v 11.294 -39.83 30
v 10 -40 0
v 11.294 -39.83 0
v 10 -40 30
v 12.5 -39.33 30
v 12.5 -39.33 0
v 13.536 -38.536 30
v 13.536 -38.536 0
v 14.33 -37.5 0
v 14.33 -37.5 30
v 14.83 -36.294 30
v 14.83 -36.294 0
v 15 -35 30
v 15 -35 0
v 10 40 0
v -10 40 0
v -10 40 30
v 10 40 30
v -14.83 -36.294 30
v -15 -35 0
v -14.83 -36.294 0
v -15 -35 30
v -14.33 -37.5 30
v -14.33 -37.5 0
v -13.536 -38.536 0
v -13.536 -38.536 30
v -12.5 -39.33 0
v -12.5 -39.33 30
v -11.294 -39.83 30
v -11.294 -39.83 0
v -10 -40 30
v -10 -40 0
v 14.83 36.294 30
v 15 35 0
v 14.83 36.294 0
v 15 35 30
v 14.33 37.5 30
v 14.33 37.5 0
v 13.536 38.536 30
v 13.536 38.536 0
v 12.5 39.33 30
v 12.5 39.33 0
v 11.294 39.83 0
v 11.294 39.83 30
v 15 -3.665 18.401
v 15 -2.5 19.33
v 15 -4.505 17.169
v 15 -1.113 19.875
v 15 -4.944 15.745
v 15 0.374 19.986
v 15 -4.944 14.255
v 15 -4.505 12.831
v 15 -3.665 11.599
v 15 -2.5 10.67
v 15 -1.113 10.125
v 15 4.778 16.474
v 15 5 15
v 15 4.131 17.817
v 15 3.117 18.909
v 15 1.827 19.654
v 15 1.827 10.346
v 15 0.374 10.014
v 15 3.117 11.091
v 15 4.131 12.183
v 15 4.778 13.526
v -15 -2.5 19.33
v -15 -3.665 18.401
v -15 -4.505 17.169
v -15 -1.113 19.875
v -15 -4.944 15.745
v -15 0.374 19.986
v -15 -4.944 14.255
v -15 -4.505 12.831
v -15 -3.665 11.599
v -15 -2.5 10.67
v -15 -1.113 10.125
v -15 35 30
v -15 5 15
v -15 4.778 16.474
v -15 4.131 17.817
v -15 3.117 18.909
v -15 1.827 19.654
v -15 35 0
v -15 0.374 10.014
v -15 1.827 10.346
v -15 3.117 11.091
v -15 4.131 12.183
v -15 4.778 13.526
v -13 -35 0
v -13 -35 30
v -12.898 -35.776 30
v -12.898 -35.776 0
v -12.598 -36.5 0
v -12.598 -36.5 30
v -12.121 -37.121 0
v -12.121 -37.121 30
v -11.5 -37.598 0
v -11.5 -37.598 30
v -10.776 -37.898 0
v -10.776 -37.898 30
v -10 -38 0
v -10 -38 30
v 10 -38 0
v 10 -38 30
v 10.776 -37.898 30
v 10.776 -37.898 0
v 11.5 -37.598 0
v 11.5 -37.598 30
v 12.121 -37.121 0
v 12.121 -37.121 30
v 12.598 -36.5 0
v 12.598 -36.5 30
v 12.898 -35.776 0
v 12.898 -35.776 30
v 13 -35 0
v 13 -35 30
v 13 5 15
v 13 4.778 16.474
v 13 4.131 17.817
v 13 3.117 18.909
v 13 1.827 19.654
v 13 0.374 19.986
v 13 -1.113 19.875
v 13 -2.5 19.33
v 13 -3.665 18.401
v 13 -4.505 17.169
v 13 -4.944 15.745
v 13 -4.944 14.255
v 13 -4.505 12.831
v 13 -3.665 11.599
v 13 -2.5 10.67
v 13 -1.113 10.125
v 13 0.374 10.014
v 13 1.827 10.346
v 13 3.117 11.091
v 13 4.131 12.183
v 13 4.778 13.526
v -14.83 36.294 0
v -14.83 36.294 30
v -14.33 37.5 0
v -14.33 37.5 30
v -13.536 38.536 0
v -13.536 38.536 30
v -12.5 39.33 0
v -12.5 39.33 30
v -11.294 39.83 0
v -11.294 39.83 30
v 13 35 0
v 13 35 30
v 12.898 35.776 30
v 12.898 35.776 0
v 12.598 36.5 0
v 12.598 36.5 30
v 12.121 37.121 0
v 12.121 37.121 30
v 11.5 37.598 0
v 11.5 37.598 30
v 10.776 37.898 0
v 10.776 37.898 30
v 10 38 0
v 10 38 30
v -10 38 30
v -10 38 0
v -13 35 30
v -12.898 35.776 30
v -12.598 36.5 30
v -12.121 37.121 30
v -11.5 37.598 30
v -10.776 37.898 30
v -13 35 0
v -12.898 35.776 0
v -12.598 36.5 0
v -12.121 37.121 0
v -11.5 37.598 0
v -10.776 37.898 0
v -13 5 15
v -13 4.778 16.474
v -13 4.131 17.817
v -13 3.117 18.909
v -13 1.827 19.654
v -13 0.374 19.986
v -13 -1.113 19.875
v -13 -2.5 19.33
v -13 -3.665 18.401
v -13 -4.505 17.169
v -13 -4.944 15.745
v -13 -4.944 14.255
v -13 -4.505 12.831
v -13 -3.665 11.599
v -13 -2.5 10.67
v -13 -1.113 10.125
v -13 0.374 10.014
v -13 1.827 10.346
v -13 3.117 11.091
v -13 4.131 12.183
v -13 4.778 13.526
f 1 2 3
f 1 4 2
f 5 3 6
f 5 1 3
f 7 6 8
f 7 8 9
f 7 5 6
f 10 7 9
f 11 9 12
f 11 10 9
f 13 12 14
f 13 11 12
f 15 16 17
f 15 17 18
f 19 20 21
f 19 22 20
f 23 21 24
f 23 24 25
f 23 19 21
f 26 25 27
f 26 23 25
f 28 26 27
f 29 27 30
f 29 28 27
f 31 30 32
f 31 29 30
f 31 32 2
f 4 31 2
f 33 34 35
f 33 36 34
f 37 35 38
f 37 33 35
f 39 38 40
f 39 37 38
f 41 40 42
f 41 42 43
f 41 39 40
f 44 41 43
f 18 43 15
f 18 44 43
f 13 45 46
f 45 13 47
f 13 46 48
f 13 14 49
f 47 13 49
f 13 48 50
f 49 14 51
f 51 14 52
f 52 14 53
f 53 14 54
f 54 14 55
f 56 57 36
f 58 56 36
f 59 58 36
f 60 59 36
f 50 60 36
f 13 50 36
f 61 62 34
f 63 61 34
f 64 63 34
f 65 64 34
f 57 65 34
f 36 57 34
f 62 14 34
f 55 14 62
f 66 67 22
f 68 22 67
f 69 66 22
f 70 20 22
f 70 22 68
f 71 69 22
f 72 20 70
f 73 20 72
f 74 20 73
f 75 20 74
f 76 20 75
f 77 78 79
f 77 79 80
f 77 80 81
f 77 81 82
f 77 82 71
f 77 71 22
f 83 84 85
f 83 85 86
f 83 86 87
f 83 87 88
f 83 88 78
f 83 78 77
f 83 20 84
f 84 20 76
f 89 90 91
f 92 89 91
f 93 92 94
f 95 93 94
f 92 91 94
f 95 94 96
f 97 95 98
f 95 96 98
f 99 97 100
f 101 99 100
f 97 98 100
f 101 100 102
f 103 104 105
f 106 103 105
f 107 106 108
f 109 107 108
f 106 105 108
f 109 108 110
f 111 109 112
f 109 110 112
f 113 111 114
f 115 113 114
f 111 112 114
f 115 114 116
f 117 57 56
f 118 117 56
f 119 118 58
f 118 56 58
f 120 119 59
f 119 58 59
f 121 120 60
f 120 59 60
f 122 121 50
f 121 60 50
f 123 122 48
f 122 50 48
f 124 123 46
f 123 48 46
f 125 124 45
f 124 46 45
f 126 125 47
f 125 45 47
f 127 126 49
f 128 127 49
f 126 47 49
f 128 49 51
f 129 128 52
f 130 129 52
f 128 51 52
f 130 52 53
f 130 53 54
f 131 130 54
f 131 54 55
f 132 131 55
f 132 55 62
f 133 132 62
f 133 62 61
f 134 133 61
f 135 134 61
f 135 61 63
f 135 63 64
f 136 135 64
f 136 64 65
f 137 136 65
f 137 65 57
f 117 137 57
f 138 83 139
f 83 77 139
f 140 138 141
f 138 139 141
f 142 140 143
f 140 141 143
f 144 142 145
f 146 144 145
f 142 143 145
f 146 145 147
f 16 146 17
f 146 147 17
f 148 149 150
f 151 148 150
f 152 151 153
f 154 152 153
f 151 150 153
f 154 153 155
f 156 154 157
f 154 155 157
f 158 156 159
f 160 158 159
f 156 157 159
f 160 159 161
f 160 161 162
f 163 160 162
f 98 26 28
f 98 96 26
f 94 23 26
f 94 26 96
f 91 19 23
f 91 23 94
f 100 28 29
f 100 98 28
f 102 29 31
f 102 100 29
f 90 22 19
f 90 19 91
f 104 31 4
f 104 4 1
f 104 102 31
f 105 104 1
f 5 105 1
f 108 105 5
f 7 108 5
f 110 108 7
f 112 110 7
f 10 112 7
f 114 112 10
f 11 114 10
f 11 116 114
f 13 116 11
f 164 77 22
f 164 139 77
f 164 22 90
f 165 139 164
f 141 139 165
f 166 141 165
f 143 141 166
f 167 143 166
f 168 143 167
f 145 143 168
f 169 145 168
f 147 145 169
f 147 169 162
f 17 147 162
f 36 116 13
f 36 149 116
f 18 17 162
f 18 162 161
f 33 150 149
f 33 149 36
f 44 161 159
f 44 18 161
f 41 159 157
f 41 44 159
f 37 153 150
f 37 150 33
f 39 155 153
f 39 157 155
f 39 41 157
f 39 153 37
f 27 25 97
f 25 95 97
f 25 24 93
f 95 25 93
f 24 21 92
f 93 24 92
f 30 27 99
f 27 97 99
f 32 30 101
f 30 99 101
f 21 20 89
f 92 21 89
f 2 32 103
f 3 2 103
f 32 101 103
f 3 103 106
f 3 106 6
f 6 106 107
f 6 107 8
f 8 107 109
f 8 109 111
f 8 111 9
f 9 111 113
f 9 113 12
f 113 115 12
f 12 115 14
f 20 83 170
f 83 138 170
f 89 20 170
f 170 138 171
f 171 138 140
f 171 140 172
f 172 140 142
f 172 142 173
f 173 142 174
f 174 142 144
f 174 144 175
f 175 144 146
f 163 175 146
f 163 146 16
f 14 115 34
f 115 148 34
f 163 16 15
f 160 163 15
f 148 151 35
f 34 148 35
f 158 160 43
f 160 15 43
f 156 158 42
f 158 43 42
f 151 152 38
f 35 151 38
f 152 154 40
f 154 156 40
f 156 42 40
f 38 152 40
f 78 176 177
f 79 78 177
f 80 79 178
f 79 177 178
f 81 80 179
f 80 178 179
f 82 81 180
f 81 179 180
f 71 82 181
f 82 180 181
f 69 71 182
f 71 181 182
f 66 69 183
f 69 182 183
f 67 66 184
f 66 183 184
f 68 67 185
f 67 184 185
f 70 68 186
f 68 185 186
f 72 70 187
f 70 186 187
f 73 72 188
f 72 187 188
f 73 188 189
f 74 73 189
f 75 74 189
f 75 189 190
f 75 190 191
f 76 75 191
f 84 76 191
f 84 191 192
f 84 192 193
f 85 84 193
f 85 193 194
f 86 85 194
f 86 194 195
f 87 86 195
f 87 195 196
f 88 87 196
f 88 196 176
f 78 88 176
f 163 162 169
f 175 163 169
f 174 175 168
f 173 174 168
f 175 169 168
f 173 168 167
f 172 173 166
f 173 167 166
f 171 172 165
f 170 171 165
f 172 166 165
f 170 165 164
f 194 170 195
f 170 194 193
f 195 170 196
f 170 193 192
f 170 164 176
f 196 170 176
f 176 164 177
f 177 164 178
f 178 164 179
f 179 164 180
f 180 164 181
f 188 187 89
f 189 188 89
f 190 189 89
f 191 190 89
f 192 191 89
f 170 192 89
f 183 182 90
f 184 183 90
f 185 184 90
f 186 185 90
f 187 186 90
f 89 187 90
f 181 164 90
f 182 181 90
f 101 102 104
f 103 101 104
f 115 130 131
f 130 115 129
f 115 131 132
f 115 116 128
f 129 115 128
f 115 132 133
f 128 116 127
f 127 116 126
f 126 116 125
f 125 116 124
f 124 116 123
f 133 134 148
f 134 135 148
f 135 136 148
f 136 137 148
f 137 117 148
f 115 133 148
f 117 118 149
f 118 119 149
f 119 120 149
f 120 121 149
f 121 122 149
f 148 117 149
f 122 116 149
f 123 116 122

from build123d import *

# Parameters (mm, degrees)
F0_W     = 30
F0_H     = 80
F1_DEPTH = 30
F2_R     = 5
F4_DEPTH = 30
F5_R     = 5
F6_DEPTH = 30


with BuildPart() as f1:
    # F0 (on Top) → F1 (new body)
    with BuildSketch(Plane.XY):
        Rectangle(F0_W, F0_H)
    extrude(amount=F1_DEPTH)

    # F2
    f2_edges = [f1.edges().sort_by_distance(p)[0] for p in [
        (15, 40, 15),
        (-15, 40, 15),
        (-15, -40, 15),
        (15, -40, 15),
    ]]
    fillet(f2_edges, radius=F2_R)

    # F3 (on face) → F4 (cut)
    with BuildSketch(Plane.XY.offset(30)):
        with BuildLine():
            ThreePointArc((13, 35), (12.12132, 37.12132), (10, 38))
            Line((10, 38), (-10, 38))
            ThreePointArc((-10, 38), (-12.12132, 37.12132), (-13, 35))
            Line((-13, 35), (-13, -35))
            ThreePointArc((-13, -35), (-12.12132, -37.12132), (-10, -38))
            Line((-10, -38), (10, -38))
            ThreePointArc((10, -38), (12.12132, -37.12132), (13, -35))
            Line((13, -35), (13, 35))
        make_face()
    extrude(amount=-F4_DEPTH, mode=Mode.SUBTRACT)

    # F5 (on face) → F6 (cut)
    with BuildSketch(Plane.YZ.offset(15)):
        with Locations((0, 15)):
            Circle(F5_R)
    extrude(amount=-F6_DEPTH, mode=Mode.SUBTRACT)


solid = f1.part
